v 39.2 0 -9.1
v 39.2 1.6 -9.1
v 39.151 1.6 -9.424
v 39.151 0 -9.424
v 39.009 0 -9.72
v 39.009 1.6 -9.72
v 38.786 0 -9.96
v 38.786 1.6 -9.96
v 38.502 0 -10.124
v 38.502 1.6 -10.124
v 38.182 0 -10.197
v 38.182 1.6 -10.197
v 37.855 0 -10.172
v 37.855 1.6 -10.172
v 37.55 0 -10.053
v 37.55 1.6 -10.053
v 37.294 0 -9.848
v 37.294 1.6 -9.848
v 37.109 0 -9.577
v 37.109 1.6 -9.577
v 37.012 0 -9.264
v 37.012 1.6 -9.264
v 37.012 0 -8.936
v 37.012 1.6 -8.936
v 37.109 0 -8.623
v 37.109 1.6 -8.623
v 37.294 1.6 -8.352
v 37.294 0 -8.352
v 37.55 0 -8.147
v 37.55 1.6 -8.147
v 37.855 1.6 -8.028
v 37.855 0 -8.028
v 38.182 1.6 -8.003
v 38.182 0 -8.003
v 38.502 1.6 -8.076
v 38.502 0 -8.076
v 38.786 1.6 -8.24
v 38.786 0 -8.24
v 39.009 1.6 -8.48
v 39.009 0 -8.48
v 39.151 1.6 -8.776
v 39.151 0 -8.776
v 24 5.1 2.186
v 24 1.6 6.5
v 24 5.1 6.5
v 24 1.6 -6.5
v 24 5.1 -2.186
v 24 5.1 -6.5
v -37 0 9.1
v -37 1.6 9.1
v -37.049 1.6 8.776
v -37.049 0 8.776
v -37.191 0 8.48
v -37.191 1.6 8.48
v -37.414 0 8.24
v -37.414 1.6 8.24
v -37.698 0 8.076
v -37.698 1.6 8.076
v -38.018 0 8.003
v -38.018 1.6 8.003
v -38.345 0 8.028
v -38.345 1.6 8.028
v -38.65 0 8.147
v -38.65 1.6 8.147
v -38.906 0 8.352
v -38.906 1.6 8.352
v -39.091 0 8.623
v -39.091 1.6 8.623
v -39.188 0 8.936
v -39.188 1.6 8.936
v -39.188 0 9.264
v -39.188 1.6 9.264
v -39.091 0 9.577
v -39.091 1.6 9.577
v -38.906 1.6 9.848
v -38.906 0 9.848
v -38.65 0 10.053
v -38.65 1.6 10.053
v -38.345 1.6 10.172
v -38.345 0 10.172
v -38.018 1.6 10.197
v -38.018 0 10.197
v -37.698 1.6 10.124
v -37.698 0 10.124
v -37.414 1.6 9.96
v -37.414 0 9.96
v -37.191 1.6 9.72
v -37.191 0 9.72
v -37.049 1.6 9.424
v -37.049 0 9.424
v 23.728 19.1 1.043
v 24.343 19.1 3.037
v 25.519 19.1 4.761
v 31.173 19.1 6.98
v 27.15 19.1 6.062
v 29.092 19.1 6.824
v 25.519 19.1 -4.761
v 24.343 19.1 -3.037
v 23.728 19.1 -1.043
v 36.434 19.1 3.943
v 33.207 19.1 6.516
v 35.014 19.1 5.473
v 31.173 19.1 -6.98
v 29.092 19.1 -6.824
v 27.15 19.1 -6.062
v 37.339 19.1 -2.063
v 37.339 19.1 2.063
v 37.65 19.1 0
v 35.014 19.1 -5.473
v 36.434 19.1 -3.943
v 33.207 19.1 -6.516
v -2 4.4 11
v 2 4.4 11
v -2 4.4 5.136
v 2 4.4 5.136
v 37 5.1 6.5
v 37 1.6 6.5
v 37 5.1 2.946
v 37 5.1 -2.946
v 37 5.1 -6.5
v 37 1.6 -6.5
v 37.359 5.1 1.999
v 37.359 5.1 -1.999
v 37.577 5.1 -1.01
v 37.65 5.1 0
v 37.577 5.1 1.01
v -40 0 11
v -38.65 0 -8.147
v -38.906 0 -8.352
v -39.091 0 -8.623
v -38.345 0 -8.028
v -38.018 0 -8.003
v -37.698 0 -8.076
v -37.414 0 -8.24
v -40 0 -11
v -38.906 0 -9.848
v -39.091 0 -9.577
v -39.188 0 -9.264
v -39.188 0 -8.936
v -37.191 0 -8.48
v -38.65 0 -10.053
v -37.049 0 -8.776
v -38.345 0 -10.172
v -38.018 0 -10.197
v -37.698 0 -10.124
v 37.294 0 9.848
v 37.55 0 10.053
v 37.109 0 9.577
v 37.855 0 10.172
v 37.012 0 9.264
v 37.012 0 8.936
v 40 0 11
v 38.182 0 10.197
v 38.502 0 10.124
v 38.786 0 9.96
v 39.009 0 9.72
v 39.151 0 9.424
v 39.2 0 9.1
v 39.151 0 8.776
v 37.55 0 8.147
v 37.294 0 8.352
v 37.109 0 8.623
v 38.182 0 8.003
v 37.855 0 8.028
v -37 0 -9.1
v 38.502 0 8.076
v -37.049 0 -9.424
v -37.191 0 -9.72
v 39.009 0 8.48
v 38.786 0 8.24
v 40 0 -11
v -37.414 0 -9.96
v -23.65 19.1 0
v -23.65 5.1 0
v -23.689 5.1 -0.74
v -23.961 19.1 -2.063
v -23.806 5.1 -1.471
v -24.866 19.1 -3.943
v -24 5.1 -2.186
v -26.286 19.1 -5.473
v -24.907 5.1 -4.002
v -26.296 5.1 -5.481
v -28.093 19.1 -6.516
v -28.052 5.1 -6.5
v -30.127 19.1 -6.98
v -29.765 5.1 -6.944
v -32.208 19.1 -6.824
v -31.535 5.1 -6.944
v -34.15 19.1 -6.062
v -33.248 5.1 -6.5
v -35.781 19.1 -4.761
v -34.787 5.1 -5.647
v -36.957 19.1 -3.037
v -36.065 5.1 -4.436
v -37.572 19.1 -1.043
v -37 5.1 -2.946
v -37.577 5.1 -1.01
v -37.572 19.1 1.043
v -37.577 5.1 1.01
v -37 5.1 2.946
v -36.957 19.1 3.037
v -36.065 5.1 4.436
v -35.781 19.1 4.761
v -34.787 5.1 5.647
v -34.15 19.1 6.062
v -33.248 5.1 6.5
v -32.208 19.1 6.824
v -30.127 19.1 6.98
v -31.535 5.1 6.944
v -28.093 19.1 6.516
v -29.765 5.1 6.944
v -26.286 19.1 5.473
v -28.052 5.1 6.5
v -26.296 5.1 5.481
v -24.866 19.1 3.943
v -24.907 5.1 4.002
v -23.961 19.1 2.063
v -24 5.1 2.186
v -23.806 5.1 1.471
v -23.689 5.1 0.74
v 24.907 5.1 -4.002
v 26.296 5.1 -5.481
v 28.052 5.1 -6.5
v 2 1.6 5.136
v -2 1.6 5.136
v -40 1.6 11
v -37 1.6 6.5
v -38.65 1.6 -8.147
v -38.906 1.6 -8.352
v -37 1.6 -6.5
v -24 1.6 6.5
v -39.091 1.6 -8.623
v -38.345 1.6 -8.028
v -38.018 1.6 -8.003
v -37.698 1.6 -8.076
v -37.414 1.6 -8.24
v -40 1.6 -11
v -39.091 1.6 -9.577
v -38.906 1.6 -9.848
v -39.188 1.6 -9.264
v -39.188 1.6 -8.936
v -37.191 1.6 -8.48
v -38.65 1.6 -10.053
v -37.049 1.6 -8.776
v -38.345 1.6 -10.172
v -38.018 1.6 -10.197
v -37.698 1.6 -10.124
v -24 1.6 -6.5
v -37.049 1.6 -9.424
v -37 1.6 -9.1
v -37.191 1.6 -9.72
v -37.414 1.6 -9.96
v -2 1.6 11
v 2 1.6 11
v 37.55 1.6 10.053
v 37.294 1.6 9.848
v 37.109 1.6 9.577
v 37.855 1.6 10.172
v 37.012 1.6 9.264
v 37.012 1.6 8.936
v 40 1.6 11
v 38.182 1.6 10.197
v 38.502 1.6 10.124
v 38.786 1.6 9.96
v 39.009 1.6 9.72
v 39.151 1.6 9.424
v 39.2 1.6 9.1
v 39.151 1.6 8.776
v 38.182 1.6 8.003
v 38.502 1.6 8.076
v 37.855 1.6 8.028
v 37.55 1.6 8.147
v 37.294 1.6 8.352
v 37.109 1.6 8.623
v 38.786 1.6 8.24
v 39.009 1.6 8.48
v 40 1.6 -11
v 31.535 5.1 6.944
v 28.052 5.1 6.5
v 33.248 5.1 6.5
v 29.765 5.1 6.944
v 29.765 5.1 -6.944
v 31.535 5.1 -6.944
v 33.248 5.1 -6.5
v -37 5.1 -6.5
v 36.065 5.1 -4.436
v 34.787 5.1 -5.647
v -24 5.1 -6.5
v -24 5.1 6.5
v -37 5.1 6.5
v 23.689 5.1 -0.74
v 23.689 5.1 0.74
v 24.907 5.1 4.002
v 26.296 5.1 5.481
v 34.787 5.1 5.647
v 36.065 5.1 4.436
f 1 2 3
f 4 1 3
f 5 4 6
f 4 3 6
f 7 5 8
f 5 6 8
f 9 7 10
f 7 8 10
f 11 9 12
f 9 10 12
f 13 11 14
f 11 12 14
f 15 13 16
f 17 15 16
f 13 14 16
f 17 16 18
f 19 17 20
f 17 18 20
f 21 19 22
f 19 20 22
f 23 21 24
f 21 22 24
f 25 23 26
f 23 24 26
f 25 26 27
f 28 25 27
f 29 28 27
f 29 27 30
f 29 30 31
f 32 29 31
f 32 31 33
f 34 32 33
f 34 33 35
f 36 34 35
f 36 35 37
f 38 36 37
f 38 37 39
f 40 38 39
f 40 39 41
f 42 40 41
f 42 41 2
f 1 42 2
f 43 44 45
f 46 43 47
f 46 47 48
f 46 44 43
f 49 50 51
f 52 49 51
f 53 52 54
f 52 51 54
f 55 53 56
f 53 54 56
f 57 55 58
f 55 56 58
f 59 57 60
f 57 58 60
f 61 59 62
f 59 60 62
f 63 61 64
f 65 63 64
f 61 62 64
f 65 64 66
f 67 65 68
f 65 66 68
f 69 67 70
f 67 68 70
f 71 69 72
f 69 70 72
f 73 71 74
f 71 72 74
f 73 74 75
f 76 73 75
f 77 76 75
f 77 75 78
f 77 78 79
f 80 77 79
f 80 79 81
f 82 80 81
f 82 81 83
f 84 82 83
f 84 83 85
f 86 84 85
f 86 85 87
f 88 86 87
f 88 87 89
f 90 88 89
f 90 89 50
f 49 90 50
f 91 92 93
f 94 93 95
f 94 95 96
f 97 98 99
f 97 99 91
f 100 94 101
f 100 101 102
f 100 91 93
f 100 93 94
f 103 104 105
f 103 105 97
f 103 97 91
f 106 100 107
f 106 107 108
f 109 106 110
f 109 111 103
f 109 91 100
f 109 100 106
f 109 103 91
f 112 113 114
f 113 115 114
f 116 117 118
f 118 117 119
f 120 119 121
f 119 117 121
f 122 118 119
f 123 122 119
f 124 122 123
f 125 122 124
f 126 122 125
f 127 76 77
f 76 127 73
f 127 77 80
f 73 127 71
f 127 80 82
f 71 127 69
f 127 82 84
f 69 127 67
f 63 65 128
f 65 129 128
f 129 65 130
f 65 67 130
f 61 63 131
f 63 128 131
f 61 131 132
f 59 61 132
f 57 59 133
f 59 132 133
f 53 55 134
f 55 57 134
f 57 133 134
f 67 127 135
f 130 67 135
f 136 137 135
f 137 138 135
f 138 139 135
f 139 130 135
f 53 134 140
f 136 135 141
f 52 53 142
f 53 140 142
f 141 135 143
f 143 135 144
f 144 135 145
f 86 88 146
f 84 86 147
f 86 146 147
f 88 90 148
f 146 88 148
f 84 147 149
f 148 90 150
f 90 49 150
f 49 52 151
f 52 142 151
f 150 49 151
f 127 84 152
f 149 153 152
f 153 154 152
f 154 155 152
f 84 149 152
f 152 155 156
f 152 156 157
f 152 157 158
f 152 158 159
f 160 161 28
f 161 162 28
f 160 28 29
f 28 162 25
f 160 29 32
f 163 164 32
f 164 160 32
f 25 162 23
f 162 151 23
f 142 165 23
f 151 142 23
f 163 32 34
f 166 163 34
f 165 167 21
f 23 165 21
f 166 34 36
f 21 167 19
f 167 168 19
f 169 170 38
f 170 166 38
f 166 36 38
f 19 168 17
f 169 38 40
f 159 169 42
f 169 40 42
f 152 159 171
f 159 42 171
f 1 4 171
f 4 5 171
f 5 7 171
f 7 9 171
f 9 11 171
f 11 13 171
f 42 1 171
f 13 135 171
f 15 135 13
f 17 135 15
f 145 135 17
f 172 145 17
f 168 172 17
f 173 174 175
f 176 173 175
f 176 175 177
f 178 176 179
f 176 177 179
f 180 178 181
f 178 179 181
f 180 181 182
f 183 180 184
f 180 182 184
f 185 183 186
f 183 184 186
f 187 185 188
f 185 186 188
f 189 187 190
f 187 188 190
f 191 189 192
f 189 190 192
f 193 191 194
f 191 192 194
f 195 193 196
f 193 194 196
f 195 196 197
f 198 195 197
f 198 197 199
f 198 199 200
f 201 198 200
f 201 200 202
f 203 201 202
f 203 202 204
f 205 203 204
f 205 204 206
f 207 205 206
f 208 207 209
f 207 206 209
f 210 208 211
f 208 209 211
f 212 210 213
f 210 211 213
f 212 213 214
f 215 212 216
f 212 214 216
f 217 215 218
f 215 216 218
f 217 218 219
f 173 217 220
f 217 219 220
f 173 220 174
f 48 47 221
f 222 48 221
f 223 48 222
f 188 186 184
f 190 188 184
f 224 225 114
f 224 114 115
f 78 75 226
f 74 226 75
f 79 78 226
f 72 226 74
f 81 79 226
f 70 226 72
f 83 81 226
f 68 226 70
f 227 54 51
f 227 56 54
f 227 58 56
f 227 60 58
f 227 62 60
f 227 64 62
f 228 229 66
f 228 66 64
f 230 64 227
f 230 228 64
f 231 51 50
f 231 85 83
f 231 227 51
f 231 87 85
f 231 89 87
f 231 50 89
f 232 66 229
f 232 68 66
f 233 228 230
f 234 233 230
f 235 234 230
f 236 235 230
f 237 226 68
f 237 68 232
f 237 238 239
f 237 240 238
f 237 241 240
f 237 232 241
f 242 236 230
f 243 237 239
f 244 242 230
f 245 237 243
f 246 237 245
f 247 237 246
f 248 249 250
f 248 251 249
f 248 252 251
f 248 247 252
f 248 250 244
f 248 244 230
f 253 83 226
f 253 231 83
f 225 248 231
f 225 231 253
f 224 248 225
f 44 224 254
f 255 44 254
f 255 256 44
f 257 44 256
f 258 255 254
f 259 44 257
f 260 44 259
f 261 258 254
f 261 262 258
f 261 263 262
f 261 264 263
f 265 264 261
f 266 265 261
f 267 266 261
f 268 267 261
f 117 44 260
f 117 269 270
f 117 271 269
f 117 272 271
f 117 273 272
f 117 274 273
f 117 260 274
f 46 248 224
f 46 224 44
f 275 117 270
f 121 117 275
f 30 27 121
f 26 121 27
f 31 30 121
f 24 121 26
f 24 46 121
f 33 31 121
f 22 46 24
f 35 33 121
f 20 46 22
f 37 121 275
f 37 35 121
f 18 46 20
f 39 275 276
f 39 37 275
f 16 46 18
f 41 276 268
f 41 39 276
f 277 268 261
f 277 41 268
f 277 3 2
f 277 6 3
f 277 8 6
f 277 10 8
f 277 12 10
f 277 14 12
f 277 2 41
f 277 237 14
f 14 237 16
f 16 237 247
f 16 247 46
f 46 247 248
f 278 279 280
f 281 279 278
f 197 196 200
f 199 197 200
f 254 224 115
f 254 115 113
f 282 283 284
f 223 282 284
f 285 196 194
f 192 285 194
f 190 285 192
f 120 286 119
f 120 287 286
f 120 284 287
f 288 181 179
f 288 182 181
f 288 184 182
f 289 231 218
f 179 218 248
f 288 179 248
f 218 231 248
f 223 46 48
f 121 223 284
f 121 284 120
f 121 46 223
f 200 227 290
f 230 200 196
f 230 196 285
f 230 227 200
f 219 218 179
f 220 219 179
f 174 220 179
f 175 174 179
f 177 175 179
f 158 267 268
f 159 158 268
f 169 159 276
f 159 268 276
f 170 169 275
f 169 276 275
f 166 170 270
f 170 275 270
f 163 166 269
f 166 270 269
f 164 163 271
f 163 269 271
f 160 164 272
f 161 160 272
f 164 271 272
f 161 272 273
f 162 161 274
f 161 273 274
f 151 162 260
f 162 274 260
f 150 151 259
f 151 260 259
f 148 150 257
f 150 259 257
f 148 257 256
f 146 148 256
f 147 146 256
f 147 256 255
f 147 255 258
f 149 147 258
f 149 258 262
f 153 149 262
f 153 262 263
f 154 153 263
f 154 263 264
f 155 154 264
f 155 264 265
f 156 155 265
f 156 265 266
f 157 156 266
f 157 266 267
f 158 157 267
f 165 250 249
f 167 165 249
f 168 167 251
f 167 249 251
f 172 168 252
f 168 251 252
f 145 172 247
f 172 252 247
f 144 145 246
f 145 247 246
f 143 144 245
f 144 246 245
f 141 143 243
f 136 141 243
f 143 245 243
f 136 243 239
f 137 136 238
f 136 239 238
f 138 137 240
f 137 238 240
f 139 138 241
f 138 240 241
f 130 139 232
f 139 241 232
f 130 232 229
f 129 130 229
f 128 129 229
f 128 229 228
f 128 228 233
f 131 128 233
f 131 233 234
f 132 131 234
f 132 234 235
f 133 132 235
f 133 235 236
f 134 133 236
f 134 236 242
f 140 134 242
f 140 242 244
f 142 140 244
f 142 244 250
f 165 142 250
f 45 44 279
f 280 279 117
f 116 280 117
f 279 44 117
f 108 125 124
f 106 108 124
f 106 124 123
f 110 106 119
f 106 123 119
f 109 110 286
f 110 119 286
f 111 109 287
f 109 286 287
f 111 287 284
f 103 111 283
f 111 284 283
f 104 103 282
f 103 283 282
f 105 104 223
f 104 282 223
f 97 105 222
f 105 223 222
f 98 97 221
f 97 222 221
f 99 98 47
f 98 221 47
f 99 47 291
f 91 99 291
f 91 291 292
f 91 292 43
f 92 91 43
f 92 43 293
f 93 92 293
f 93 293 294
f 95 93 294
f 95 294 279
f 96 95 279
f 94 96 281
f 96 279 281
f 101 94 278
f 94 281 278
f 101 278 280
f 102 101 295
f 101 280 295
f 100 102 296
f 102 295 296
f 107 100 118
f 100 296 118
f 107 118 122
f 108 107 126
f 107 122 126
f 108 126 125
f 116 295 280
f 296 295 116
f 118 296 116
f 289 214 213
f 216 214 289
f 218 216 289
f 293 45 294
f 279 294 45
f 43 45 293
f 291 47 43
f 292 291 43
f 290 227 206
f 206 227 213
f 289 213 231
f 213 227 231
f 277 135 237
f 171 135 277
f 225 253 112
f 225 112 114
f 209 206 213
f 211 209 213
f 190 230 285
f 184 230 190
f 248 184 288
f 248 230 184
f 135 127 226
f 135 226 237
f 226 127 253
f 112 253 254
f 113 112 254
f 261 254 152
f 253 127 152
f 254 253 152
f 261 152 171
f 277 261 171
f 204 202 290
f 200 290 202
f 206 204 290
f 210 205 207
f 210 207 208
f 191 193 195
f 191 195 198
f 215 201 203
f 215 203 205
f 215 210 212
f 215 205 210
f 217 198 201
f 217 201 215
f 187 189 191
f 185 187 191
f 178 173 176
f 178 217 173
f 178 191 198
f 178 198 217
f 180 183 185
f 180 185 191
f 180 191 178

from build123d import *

# Parameters (mm, degrees)
SKETCH_1_W          = 80
SKETCH_1_H          = 22
EXTRUDE_1_DEPTH     = 1.6
SKETCH_2_W          = 13
SKETCH_2_H          = 13
EXTRUDE_2_DEPTH     = 3.5
SKETCH_4_R          = 7
EXTRUDE_3_DEPTH     = 14
SKETCH_5_R          = 1.1
CUT_EXTRUDE_1_DEPTH = 2.6
EXTRUDE_4_DEPTH     = 2.8


with BuildPart() as part:
    # 草图1 → 凸台-拉伸1 (new body)
    with BuildSketch(Plane(origin=(0, 0, 0), x_dir=(1, 0, 0), z_dir=(0, 1, 0))):
        Rectangle(SKETCH_1_W, SKETCH_1_H)
    extrude(amount=EXTRUDE_1_DEPTH)

    # 草图2 → 凸台-拉伸2 (add)
    with BuildSketch(Plane(origin=(0, 1.6, 0), x_dir=(1, 0, 0), z_dir=(0, 1, 0))):
        with Locations((30.5, 0)):
            Rectangle(SKETCH_2_W, SKETCH_2_H)
        with Locations((-30.5, 0)):
            Rectangle(SKETCH_2_W, SKETCH_2_H)
    extrude(amount=EXTRUDE_2_DEPTH)

    # 草图4 → 凸台-拉伸3 (add)
    with BuildSketch(Plane(origin=(0, 5.1, 0), x_dir=(1, 0, 0), z_dir=(0, 1, 0))):
        with Locations((-30.65, 0)):
            Circle(SKETCH_4_R)
        with Locations((30.65, 0)):
            Circle(SKETCH_4_R)
    extrude(amount=EXTRUDE_3_DEPTH)

    # 草图5 → 切除-拉伸1 (cut, through all)
    with BuildSketch(Plane(origin=(0, 1.6, 0), x_dir=(1, 0, 0), z_dir=(0, 1, 0))):
        with Locations((-38.1, 9.1)):
            Circle(SKETCH_5_R)
        with Locations((-38.1, -9.1)):
            Circle(SKETCH_5_R)
        with Locations((38.1, -9.1)):
            Circle(SKETCH_5_R)
        with Locations((38.1, 9.1)):
            Circle(SKETCH_5_R)
    extrude(amount=-CUT_EXTRUDE_1_DEPTH, mode=Mode.SUBTRACT)

    # 草图6 → 凸台-拉伸4 (add)
    with BuildSketch(Plane(origin=(0, 1.6, 0), x_dir=(1, 0, 0), z_dir=(0, 1, 0))):
        Polygon((0, -11), (-2, -11), (-2, -5.136292724), (2, -5.136292724), (2, -11), align=None)
    extrude(amount=EXTRUDE_4_DEPTH)


solid = part.part
